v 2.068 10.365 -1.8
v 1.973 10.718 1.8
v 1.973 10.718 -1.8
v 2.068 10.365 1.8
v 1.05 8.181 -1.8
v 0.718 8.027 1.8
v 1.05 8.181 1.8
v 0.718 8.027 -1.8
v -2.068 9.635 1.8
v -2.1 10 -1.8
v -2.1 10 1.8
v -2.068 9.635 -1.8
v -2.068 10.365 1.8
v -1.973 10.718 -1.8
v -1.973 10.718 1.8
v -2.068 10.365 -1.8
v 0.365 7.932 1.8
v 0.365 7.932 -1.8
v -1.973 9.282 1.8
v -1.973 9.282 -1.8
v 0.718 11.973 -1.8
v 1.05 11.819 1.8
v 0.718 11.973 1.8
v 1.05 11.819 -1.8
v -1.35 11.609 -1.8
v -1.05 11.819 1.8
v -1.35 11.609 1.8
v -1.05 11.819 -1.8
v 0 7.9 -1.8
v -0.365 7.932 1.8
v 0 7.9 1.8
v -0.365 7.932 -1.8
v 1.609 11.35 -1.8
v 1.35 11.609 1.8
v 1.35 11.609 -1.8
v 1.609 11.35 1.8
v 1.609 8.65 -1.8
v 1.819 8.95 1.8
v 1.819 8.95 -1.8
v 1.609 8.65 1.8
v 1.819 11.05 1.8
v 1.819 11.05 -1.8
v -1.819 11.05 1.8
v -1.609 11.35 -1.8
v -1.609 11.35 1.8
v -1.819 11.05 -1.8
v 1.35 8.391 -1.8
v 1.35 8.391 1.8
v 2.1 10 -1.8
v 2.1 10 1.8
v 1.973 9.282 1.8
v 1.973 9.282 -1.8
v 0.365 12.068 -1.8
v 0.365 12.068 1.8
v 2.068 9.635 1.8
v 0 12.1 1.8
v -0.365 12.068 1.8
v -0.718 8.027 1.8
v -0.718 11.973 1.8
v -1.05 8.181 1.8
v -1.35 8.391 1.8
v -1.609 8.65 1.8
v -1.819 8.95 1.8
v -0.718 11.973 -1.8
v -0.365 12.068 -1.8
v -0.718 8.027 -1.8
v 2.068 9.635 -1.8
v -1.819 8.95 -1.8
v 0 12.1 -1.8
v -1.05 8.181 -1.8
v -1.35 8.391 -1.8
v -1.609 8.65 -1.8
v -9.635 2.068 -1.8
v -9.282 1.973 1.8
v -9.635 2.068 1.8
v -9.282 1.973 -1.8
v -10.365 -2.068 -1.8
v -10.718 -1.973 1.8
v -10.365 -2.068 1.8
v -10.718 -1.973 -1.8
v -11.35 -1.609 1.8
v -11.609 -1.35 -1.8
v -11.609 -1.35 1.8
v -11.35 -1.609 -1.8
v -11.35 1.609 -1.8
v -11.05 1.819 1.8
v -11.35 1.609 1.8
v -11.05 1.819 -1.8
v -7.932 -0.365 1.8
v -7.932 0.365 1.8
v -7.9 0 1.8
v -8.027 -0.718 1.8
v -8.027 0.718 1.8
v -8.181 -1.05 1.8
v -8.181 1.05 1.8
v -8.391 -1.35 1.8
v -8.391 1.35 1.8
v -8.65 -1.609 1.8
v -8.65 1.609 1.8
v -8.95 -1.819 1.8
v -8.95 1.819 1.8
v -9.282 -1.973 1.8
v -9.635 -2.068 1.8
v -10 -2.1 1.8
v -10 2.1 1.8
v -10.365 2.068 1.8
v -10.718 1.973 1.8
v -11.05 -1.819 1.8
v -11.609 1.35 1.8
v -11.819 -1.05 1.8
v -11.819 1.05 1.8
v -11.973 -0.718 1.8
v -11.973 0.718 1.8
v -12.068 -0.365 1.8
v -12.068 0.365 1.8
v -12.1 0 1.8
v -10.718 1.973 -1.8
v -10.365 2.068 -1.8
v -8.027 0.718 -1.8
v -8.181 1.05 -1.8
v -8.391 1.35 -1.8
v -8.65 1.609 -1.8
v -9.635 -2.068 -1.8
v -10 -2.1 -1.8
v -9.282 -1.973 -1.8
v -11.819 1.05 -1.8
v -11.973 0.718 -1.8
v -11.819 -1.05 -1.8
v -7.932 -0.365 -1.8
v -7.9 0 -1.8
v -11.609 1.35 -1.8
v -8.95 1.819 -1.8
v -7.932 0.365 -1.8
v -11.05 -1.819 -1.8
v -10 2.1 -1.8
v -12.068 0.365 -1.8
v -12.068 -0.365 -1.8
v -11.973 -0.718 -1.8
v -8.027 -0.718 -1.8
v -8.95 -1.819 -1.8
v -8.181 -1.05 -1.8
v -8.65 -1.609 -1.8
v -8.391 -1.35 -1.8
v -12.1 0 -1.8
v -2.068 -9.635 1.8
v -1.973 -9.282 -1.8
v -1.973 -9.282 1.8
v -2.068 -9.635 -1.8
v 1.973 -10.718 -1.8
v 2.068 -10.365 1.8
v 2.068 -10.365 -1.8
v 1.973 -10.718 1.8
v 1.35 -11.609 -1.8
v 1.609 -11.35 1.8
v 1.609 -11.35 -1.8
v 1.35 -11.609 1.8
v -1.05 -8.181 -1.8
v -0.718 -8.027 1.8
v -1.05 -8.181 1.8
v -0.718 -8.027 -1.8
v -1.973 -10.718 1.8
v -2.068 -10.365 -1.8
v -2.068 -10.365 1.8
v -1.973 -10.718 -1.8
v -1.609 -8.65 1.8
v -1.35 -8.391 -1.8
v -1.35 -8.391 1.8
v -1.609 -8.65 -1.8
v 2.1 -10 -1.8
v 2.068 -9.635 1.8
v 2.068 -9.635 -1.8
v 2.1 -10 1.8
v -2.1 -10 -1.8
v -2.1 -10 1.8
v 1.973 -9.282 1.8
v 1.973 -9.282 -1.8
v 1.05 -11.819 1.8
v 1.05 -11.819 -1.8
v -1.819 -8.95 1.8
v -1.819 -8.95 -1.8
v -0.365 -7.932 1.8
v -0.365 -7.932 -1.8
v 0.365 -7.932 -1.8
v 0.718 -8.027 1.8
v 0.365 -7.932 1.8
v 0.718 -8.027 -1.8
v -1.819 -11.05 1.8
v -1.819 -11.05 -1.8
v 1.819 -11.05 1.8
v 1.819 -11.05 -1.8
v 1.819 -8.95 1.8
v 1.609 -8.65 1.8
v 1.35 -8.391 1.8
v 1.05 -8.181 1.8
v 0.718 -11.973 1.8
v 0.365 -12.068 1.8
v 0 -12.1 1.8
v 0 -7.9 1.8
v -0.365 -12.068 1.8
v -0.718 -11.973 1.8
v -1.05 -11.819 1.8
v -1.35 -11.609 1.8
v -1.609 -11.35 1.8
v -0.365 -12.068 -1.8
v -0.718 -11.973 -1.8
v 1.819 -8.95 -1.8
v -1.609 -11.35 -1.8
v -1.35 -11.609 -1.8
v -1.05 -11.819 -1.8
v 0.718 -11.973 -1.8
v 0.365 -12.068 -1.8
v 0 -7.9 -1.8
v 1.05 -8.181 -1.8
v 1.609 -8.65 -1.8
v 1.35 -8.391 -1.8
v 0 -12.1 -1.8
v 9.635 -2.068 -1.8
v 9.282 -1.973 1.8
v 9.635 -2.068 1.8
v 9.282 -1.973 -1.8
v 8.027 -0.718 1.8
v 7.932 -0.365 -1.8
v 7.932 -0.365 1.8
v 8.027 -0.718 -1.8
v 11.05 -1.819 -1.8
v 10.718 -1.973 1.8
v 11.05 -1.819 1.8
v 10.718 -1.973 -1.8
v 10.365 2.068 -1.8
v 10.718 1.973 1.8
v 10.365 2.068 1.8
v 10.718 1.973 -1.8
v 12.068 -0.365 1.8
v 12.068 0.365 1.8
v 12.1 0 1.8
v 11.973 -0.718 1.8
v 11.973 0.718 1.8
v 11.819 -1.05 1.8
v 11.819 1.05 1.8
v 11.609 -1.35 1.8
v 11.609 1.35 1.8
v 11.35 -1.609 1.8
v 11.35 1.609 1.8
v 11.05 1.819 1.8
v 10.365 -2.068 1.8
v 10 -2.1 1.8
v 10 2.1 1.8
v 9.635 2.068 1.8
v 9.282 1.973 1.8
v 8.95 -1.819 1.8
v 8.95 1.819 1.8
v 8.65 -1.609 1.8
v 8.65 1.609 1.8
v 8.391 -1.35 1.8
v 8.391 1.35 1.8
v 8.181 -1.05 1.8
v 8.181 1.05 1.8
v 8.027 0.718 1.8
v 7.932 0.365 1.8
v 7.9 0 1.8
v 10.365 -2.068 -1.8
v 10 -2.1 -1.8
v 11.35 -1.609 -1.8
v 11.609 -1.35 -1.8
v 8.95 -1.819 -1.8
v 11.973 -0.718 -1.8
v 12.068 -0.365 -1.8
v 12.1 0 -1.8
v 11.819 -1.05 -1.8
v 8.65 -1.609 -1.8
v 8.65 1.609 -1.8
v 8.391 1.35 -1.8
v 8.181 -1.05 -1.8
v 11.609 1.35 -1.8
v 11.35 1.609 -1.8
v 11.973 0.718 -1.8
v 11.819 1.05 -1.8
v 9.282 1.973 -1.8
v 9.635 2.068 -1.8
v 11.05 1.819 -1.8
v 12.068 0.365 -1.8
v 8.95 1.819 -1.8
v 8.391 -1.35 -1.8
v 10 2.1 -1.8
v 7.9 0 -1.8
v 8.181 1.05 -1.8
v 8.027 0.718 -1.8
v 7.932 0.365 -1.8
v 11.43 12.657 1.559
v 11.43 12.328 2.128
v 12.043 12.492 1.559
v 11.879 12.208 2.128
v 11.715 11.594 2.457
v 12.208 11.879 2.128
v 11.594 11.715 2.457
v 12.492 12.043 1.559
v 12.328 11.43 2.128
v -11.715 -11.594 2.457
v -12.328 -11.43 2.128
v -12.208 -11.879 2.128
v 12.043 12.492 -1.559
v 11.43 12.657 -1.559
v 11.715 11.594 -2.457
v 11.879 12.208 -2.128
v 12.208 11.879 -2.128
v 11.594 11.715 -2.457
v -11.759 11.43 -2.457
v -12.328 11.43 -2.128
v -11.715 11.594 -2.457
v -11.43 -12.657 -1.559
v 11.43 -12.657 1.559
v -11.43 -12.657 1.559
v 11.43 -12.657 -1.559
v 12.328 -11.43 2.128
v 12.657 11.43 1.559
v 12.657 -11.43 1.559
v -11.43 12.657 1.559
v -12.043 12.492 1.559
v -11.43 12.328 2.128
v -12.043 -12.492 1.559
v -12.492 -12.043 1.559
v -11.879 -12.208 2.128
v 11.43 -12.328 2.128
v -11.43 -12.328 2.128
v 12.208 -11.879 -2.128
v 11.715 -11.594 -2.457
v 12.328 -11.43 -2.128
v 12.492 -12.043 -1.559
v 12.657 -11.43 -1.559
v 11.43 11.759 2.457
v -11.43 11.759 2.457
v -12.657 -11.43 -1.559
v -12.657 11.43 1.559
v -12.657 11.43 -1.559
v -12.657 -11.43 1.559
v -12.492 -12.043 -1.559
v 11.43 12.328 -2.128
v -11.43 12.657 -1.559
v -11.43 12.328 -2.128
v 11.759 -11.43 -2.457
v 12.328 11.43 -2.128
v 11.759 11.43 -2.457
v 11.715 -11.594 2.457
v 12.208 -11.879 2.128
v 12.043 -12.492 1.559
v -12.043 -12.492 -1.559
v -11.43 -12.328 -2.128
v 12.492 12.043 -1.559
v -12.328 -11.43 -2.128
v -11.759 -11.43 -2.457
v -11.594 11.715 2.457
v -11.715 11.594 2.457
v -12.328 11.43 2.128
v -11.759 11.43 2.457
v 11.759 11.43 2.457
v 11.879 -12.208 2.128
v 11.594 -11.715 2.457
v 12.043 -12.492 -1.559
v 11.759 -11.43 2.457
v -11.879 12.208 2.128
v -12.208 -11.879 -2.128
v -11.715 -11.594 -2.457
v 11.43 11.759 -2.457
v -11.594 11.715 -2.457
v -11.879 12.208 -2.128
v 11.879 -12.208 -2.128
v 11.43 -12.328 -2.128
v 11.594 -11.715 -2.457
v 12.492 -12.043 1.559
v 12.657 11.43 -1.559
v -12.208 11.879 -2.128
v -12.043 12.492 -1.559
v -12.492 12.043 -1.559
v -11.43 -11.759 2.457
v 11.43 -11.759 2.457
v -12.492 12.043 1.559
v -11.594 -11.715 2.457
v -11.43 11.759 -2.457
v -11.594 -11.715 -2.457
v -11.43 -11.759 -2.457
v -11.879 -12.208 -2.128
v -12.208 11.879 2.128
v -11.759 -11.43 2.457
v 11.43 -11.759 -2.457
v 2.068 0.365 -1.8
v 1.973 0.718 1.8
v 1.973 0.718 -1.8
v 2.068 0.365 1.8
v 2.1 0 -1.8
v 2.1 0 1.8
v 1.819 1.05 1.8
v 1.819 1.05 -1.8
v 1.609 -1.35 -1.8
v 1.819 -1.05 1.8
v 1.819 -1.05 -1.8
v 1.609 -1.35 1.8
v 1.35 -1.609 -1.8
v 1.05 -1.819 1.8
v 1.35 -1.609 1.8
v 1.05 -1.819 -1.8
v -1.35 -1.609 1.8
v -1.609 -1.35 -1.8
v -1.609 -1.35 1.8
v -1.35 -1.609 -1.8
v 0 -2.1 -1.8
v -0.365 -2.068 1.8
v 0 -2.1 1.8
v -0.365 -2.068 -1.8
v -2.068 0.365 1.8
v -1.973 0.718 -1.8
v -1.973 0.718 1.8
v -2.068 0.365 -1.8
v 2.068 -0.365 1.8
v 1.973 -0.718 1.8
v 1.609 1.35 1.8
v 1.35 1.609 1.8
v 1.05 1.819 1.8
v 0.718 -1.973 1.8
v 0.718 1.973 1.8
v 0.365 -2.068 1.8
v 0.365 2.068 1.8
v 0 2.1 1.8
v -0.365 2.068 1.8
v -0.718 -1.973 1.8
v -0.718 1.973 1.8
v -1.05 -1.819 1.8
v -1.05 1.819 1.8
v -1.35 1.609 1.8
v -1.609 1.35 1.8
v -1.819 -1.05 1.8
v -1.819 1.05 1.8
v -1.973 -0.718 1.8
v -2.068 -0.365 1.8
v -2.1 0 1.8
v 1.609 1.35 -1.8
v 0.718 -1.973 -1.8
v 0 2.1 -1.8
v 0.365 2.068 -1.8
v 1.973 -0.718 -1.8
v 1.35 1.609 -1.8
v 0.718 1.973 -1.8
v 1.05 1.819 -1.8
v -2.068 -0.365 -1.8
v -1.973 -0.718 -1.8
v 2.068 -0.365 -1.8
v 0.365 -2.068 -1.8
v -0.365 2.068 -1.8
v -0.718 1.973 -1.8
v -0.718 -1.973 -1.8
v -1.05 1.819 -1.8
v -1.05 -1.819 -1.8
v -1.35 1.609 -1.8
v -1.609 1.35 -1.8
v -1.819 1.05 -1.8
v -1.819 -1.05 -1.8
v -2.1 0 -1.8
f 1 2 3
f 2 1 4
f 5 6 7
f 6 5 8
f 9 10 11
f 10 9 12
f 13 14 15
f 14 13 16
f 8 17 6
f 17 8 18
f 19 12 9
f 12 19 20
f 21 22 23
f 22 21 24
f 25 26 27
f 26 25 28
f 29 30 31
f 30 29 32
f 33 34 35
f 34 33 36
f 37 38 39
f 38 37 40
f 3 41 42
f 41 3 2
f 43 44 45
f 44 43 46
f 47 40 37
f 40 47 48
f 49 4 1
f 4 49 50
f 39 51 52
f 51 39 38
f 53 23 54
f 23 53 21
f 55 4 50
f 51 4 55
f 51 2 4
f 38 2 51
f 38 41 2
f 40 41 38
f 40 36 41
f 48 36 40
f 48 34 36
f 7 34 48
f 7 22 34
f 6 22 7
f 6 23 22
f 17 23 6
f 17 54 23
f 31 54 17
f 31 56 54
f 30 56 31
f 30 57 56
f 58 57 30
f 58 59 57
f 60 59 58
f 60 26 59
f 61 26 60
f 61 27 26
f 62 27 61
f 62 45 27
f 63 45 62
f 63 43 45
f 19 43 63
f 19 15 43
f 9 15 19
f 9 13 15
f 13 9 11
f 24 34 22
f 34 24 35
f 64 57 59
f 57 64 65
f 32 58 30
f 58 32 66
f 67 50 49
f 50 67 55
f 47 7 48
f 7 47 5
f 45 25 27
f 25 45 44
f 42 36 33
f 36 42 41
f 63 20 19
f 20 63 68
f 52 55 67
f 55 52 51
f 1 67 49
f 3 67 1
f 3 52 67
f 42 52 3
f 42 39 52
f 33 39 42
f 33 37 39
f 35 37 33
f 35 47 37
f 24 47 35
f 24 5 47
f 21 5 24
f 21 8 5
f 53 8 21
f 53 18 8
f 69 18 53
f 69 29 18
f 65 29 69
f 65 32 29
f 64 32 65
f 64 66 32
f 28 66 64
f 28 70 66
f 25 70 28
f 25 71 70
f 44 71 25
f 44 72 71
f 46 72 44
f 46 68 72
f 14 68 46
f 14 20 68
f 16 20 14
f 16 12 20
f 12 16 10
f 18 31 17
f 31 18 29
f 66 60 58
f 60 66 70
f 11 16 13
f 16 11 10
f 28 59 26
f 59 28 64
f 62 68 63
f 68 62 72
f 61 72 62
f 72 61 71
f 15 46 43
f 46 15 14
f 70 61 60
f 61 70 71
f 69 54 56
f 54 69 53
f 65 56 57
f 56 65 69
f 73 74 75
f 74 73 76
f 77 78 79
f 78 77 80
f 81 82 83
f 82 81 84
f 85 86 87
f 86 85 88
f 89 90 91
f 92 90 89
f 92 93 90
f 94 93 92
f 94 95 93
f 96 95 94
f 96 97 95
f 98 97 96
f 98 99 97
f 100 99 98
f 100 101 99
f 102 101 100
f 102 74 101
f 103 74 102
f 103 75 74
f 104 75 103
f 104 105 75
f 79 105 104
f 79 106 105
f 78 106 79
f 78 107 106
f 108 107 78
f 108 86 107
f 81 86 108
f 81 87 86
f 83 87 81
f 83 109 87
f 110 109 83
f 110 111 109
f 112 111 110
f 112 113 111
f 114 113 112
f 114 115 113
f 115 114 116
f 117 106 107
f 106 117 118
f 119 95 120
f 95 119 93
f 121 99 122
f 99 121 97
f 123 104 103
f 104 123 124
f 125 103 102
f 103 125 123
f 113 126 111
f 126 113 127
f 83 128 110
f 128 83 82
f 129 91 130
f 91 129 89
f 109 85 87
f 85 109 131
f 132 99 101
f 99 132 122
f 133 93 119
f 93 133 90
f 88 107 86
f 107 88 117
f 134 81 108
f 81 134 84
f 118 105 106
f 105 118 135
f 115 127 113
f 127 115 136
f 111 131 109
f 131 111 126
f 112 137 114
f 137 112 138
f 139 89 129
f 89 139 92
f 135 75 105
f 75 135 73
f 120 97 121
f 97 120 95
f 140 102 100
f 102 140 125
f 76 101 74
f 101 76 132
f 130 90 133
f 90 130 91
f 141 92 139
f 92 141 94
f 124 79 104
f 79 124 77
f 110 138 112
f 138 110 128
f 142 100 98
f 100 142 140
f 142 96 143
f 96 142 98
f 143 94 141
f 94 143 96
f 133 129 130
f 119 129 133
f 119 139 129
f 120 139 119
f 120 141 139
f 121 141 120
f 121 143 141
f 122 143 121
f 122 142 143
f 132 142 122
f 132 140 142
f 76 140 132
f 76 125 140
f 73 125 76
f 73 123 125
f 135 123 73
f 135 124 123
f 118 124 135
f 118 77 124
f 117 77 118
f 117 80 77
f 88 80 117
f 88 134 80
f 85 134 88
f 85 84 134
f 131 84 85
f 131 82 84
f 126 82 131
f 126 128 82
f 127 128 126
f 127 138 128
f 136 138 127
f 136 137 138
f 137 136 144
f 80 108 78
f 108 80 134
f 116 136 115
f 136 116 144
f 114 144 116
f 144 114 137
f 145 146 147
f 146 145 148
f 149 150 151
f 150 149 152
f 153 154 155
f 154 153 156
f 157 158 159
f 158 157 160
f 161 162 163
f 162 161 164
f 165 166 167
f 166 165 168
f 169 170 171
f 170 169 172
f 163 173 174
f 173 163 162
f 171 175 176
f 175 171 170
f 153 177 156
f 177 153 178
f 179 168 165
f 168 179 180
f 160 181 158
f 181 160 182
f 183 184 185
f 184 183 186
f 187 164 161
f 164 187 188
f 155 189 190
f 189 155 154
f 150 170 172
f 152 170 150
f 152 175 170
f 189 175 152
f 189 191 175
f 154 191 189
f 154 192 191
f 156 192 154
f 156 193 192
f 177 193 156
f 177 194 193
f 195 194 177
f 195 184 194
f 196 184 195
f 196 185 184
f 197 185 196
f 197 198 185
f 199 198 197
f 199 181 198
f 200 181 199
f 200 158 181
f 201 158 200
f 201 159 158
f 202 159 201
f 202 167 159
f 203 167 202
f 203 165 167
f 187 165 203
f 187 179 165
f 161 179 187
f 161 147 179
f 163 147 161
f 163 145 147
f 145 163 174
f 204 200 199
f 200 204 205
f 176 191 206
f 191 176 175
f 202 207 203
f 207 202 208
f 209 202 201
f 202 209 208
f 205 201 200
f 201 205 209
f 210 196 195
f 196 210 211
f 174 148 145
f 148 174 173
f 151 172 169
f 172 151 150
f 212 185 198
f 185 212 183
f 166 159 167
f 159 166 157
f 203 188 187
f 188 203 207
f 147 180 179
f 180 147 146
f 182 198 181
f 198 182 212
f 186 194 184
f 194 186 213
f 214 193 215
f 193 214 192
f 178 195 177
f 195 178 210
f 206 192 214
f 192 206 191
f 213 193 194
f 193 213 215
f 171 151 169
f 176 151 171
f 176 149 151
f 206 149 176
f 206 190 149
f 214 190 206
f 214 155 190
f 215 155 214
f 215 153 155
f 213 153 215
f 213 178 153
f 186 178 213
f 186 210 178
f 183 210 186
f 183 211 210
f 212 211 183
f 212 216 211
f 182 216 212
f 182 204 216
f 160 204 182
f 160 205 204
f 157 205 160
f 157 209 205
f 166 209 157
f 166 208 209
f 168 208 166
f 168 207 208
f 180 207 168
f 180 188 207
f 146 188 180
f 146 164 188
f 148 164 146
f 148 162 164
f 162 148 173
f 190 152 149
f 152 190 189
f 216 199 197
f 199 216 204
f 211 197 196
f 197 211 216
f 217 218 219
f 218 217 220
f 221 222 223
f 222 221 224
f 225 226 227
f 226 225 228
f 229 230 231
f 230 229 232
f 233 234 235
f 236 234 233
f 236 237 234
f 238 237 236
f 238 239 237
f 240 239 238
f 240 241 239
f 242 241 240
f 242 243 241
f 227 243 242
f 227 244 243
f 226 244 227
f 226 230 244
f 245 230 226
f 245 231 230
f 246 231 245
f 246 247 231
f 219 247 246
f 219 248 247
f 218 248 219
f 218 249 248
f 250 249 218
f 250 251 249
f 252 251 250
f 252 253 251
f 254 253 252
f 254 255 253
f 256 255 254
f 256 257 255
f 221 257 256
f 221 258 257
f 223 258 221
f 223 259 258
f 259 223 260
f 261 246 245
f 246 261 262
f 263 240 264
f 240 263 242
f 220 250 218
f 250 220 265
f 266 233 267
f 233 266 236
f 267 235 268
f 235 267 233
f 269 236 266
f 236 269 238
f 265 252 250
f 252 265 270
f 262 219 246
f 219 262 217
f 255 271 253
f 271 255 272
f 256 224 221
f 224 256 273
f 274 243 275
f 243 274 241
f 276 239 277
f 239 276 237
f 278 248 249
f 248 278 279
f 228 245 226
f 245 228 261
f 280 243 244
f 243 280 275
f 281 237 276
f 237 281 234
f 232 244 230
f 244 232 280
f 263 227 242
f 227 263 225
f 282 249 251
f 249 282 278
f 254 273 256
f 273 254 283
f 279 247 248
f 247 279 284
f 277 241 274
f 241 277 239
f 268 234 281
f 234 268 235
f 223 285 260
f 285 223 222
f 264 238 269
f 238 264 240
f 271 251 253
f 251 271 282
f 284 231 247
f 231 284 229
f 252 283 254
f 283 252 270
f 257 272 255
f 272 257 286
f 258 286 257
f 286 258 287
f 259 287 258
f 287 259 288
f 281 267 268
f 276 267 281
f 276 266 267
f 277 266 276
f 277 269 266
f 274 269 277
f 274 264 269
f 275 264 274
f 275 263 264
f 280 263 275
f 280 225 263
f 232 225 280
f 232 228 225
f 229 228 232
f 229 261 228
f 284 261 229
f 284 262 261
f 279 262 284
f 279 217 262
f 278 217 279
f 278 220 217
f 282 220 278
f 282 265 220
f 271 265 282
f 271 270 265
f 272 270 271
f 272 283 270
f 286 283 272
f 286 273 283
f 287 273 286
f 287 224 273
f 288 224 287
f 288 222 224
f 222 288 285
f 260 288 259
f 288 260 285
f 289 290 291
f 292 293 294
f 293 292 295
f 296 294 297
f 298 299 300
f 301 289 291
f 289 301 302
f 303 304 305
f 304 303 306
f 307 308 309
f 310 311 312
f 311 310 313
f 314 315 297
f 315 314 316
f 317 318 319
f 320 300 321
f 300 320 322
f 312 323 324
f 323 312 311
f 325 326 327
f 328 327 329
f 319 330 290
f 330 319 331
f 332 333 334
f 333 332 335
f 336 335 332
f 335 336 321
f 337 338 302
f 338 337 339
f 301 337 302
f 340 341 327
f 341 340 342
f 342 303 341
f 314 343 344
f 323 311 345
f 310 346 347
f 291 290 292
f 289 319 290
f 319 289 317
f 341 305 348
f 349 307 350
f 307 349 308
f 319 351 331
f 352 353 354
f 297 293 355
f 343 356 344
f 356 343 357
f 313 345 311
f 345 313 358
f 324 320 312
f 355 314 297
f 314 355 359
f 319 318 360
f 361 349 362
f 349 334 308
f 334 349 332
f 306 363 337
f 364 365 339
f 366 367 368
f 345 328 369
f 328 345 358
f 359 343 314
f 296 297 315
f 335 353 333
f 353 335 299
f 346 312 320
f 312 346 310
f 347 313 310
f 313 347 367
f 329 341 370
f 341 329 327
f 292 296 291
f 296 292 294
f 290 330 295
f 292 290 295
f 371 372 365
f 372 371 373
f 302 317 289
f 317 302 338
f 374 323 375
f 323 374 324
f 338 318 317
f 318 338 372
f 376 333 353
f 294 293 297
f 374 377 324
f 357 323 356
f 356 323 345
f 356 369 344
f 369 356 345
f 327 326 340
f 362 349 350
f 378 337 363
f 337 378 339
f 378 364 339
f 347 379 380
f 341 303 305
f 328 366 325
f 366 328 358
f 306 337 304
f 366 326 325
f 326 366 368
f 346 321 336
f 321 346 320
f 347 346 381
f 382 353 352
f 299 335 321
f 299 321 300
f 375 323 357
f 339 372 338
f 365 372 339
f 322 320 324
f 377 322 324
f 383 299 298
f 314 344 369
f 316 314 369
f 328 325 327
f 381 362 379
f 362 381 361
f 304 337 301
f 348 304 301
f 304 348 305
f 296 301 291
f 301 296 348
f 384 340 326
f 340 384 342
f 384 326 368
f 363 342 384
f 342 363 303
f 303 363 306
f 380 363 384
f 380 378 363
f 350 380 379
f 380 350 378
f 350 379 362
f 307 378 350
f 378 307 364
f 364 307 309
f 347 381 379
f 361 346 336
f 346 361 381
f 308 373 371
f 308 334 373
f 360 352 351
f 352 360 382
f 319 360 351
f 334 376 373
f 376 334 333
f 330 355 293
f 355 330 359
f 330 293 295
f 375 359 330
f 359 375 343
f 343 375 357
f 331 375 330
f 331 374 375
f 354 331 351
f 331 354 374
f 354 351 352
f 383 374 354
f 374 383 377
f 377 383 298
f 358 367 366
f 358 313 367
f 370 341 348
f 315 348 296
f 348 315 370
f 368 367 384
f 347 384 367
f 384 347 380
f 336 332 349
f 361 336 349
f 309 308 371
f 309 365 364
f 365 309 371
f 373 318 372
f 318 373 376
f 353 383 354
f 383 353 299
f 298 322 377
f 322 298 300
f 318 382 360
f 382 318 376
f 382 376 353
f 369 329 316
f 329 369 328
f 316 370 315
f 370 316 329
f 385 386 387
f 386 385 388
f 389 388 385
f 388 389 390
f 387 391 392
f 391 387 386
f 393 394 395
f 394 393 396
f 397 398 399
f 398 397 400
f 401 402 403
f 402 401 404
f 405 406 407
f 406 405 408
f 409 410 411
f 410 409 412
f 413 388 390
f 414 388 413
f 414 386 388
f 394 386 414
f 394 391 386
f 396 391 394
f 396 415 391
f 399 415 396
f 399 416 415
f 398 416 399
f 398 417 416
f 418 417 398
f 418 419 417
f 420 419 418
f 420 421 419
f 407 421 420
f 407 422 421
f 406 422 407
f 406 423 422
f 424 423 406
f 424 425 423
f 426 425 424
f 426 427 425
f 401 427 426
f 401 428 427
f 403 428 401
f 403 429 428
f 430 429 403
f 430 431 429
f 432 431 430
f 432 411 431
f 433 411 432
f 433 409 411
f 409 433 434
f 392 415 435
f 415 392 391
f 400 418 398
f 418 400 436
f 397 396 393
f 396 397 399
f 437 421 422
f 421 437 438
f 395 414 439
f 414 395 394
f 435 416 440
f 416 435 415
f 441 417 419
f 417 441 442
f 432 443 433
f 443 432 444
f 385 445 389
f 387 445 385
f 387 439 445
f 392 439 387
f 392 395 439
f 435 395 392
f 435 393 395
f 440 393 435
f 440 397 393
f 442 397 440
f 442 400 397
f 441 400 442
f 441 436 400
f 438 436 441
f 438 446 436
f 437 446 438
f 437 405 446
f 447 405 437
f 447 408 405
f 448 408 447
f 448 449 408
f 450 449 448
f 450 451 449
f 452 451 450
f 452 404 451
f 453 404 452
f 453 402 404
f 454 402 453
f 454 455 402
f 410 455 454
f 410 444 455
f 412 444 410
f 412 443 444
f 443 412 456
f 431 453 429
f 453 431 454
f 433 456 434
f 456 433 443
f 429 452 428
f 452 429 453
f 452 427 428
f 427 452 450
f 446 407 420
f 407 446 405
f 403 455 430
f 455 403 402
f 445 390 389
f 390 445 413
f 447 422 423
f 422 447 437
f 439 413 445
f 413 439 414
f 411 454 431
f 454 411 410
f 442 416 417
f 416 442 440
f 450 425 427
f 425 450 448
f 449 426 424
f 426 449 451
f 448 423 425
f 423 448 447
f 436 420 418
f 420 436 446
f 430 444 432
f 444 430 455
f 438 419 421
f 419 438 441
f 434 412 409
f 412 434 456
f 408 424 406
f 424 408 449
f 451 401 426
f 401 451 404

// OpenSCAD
//
// hillside.scad
//

// unit is mm

inch = 25.4;
h = 5; // height unit, 5mm
o2 = 0.2;
//br = 3 / 2; // ball radius
br = 1.7;

r = inch / 2;
t = r / cos(30);
rr = r / 10;
br2 = br * 2;
tr2 = t + r / 2;

//echo("bh", br + 2 * o2);
//echo("br + 2 * o2", 5 + 2 * o2);

module balcyl() { cylinder(r=br + 2 * o2, h=br * 2 + o2, center=true, $fn=36); }

module hex(height=1) {

  hei = h * height;

  difference() {
    translate([ 0, 0, hei * -0.5 ])
      hull()
        for (a = [ 0 : 60 : 300 ]) {
          rotate([ 0, 0, a ]) {
            //translate([ 0, t - rr, 0 ]) cylinder(r=rr, h=h, $fn=12);
            translate([ 0, t - rr, hei - rr ]) sphere(r=rr, $fn=12);
            translate([ 0, t - rr, rr ]) sphere(r=rr, $fn=12);
          }
        }

    h0 = hei / 2 - h / 2;
    h1 = -hei / 2 + h / 2;

    #translate([ 0, 0, h0 ]) balcyl();
    for (a = [ 30 : 60 : 330 ]) {
      #rotate([ 0, 0, a ]) translate([ 0, r - br - 4 * o2, h0 ]) balcyl();
    }

    if (height > 1) {
      #translate([ 0, 0, h1 ]) balcyl(); // center ball
      for (a = [ 30 : 60 : 330 ]) {
        #rotate([ 0, 0, a ]) translate([ 0, r - br - 4 * o2, h1 ]) balcyl();
      }
    }
  }
}

module square(height=1) {

  hei = h * height;
  rm = r - rr;

  difference() {
    translate([ 0, 0, hei * -0.5 ])
      hull()
        for (hh = [ hei - rr, rr ]) {
          translate([ rm, rm, hh ]) sphere(r=rr, $fn=12);
          translate([ -rm, rm, hh ]) sphere(r=rr, $fn=12);
          translate([ -rm, -rm, hh ]) sphere(r=rr, $fn=12);
          translate([ rm, -rm, hh ]) sphere(r=rr, $fn=12);
        }

    h0 = hei / 2 - h / 2;
    h1 = -hei / 2 + h / 2;

    #translate([ 0, 0, h0 ]) balcyl();
    for (a = [ 0 : 90 : 270 ]) {
      #rotate([ 0, 0, a ]) translate([ 0, r - br - 5 * o2, h0 ]) balcyl();
    }

    if (height > 1) {
      #translate([ 0, 0, h1 ]) balcyl(); // center ball
      for (a = [ 0 : 90 : 270 ]) {
        #rotate([ 0, 0, a ]) translate([ 0, r - br - 5 * o2, h1 ]) balcyl();
      }
    }
  }
}

//hex();
//translate([ inch * 1.1, 0, 0 ]) hex(3);
//translate([ inch * 2.2, 0, 0 ]) hex(5);

module hgroup(x, y, height=1) {

  for (xx = [ 0 : x - 1 ]) {
    for (yy = [ 0 : y - 1 ]) {
      if (yy % 2 == 0) translate([ xx * inch, yy * tr2, 0 ]) hex(height);
      else translate([ r + xx * inch, yy * tr2, 0 ]) hex(height);
    }
  }
}

module hflower(height=1) {

  r2 = r / 2;

  translate([ -r, tr2, 0 ]) hgroup(2, 1, height);
  translate([ -2 * r, 0, 0 ]) hgroup(3, 1, height);
  translate([ -r, -tr2, 0 ]) hgroup(2, 1, height);
}

module tri(height=1) {

  hei = h * height;

  translate([ 0, -t / 2, hei * -0.5 ])
    hull()
      for (a = [ -60, 0, 60 ]) {
        rotate([ 0, 0, a ]) {
          translate([ 0, t - rr, hei - rr ]) sphere(r=rr, $fn=12);
          translate([ 0, t - rr, rr ]) sphere(r=rr, $fn=12);
        }
      }
}

////th = 1 + 15 + 1; // 105 hexes (15 x 7)
//th = 1 + 3;
//hflower();
////for (a = [ 0 : 60 : 300 ])
//for (a = [ 0 : 120 : 300 ]) // 3 prongs FTW
//  rotate([ 0, 0, a ])
//    translate([ 0, -tr2 - t - 2 * o2, ((th - 1) * h) / 2 ])
//      tri(th);

square();
//translate([ inch, 0, 0 ]) square(3);
